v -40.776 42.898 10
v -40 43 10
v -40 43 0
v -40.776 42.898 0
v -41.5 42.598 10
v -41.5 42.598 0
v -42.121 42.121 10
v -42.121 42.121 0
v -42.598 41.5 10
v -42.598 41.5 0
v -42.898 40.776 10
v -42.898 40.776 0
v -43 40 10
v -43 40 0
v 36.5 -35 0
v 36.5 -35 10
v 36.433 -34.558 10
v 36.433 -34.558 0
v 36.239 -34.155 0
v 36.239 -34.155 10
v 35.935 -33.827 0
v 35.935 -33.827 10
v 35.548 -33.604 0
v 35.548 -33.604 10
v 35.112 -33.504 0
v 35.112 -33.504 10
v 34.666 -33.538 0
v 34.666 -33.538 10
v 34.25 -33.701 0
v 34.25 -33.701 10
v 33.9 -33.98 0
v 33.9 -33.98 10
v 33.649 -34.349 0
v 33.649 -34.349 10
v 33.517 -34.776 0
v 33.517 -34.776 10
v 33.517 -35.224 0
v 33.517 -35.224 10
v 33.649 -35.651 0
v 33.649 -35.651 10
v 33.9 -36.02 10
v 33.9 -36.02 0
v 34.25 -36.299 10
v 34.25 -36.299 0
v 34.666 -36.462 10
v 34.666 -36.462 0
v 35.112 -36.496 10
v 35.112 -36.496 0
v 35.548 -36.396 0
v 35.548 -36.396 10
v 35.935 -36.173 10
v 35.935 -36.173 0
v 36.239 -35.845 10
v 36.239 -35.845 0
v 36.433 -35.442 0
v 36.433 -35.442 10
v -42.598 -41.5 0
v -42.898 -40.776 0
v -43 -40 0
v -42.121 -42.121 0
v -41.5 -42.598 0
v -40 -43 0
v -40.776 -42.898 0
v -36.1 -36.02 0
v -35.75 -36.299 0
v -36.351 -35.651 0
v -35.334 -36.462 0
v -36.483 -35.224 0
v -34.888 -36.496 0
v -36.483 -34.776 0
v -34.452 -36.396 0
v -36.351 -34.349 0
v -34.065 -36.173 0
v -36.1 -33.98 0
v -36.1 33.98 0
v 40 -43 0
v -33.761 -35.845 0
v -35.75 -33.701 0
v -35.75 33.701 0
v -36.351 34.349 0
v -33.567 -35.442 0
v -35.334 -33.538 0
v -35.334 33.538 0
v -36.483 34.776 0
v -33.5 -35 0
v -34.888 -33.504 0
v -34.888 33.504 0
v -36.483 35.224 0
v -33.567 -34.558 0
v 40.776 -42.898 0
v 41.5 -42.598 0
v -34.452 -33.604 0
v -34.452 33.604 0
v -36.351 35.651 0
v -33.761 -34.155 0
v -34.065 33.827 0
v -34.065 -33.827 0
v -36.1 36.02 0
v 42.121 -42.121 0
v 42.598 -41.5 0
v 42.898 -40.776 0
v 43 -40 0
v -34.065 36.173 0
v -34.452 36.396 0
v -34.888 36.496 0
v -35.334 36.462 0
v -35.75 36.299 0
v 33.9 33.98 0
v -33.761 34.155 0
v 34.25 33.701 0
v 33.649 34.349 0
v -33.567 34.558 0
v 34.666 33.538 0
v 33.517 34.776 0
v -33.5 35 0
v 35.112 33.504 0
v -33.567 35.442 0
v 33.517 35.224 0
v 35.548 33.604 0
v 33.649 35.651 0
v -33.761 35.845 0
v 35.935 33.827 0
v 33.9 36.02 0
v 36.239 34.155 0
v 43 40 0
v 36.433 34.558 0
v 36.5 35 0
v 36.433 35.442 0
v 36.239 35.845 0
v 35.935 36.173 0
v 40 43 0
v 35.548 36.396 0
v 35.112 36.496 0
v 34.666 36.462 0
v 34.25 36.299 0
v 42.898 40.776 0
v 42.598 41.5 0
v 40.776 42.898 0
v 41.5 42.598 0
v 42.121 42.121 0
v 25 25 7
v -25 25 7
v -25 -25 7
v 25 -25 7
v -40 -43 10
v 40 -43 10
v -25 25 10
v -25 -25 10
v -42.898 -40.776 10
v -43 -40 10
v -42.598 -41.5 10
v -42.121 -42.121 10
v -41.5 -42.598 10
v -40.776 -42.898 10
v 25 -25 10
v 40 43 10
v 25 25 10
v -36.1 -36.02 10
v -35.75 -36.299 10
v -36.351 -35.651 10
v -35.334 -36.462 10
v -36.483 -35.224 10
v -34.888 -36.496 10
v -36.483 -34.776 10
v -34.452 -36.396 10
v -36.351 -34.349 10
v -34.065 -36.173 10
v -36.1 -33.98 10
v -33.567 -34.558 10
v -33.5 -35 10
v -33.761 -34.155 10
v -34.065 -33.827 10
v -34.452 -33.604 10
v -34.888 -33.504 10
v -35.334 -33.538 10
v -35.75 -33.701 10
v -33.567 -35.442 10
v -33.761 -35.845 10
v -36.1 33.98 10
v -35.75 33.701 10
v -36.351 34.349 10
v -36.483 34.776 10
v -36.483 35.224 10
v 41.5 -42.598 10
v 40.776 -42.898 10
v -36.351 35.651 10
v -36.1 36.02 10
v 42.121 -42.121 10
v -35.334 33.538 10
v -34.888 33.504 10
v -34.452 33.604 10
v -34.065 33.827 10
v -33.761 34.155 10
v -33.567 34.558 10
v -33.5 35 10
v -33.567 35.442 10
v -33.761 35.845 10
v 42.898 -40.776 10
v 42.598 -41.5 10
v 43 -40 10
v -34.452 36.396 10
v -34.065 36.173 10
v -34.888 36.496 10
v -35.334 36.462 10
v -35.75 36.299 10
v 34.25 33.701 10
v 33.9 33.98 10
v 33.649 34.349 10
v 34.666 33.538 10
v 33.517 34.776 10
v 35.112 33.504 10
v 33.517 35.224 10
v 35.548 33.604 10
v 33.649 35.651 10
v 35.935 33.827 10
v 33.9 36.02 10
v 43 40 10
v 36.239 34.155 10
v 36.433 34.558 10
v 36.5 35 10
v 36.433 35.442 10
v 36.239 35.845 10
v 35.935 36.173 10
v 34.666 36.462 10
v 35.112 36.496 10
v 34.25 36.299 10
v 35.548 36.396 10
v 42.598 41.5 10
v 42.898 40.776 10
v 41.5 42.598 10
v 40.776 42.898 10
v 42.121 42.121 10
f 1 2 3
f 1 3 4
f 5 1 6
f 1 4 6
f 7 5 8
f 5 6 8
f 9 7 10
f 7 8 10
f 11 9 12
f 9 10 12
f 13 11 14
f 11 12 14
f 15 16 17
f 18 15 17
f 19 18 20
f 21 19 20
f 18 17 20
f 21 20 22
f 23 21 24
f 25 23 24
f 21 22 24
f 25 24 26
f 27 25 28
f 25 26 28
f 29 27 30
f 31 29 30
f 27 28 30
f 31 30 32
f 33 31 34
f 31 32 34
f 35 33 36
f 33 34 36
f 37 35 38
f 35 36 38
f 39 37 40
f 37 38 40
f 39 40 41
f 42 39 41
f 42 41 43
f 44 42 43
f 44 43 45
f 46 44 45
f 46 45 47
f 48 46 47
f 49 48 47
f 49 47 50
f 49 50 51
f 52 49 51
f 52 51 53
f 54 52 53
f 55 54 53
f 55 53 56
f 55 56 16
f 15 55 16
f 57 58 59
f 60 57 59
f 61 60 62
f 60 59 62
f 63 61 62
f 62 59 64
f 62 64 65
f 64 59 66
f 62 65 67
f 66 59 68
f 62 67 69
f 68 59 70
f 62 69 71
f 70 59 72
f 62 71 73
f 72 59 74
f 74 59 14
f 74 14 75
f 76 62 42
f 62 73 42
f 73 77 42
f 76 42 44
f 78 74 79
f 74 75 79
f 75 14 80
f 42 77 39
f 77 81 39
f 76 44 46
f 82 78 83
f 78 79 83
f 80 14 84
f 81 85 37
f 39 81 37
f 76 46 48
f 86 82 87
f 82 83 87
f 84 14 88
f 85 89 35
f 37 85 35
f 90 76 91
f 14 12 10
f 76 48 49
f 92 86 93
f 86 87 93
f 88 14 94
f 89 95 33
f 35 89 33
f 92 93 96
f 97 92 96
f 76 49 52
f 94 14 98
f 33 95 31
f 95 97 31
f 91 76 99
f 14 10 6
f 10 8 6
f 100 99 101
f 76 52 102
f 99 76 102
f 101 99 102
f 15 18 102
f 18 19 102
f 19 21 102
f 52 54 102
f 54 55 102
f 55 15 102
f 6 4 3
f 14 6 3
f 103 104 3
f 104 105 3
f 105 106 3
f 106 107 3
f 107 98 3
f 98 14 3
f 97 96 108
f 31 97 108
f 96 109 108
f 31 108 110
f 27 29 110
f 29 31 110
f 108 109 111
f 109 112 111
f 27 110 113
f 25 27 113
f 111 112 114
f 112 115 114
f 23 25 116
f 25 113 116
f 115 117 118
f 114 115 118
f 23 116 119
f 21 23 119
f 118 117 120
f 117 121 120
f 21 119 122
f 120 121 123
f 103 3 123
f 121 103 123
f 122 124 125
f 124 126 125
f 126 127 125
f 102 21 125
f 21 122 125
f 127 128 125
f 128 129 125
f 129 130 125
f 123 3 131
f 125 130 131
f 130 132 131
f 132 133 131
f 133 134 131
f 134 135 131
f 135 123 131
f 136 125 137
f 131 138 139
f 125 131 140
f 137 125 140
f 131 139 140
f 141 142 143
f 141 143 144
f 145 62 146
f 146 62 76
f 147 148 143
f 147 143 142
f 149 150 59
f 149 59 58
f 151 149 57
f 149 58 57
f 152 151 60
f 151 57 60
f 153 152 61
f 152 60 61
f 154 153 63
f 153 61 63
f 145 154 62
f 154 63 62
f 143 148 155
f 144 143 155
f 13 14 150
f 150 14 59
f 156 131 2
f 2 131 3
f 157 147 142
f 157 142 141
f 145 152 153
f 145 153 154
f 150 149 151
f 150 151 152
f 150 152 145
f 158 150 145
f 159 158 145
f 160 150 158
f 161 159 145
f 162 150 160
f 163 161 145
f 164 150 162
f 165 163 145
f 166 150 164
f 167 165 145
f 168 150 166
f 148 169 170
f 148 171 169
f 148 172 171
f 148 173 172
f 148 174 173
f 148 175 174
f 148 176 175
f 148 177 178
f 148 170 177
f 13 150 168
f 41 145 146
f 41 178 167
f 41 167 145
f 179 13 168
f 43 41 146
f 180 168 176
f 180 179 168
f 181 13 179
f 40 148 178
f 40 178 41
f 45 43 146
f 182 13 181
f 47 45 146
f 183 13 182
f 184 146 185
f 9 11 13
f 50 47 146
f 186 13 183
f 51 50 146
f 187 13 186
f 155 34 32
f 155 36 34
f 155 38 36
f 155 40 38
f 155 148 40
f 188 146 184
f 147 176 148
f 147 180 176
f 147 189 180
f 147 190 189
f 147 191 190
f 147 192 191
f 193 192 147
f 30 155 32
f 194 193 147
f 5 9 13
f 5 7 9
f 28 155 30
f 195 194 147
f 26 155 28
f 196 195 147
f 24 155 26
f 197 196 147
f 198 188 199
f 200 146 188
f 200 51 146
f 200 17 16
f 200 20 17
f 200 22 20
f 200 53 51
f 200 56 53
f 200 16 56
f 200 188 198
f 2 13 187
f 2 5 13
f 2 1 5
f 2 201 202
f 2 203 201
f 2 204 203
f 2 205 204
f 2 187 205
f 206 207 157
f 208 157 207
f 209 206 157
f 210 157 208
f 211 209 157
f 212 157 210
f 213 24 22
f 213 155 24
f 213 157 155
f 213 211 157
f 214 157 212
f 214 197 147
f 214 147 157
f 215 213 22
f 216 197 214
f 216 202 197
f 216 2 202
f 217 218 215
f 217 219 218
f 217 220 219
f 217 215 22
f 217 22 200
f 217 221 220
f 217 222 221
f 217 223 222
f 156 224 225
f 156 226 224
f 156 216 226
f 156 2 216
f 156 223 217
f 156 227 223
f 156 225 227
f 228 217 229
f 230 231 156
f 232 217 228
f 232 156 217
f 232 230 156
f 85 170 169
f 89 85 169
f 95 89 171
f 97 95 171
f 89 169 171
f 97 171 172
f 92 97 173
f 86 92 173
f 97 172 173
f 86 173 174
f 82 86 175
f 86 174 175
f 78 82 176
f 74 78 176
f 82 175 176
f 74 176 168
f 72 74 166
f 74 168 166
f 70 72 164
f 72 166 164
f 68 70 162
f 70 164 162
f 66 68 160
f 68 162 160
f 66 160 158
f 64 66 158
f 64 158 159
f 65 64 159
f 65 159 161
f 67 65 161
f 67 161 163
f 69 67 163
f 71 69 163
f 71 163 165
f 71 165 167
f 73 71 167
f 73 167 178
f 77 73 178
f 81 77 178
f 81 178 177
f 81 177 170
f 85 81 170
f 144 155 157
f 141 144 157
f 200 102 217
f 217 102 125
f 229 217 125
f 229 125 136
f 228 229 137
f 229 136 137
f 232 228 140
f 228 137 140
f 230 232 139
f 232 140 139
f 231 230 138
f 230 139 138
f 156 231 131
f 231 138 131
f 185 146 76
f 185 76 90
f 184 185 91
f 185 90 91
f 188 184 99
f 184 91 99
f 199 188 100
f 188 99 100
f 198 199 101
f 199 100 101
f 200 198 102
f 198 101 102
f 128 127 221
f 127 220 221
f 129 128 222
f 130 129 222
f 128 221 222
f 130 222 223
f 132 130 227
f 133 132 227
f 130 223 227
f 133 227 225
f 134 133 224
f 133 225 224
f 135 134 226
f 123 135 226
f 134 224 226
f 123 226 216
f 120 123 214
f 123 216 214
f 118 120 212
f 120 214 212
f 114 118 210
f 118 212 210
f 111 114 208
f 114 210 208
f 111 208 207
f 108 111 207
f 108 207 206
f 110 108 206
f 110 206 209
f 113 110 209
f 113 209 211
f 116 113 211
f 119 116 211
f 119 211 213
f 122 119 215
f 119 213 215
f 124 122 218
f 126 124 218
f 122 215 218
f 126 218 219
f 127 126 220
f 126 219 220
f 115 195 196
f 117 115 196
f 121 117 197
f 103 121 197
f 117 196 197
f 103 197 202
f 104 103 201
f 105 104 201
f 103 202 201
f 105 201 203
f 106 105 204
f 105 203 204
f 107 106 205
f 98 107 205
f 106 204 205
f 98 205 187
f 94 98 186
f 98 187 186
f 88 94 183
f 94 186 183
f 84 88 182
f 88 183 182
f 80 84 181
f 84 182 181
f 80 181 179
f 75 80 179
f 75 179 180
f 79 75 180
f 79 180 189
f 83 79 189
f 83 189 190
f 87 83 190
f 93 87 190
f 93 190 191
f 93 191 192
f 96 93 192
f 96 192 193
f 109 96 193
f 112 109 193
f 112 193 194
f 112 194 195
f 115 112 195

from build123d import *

# Parameters (mm, degrees)
EXTRUDE_1_DEPTH     = 10
SKETCH_2_W          = 50
SKETCH_2_H          = 50
CUT_EXTRUDE_1_DEPTH = 3
SKETCH_3_R          = 1.5
CUT_EXTRUDE_2_DEPTH = 87


with BuildPart() as part:
    # 草图1 → 凸台-拉伸1 (new body)
    with BuildSketch(Plane.XY):
        with BuildLine():
            Line((-40, -43), (40, -43))
            ThreePointArc((40, -43), (42.121320344, -42.121320344), (43, -40))
            Line((43, -40), (43, 40))
            ThreePointArc((43, 40), (42.121320344, 42.121320344), (40, 43))
            Line((40, 43), (-40, 43))
            ThreePointArc((-40, 43), (-42.121320344, 42.121320344), (-43, 40))
            Line((-43, 40), (-43, -40))
            ThreePointArc((-43, -40), (-42.121320344, -42.121320344), (-40, -43))
        make_face()
    extrude(amount=EXTRUDE_1_DEPTH)

    # 草图2 → 切除-拉伸1 (cut)
    with BuildSketch(Plane.XY.offset(10)):
        Rectangle(SKETCH_2_W, SKETCH_2_H)
    extrude(amount=-CUT_EXTRUDE_1_DEPTH, mode=Mode.SUBTRACT)

    # 草图3 → 切除-拉伸2 (cut, symmetric)
    with BuildSketch(Plane.XY.offset(10)):
        with Locations((-35, -35)):
            Circle(SKETCH_3_R)
        with Locations((-35, 35)):
            Circle(SKETCH_3_R)
        with Locations((35, -35)):
            Circle(SKETCH_3_R)
        with Locations((35, 35)):
            Circle(SKETCH_3_R)
    extrude(amount=CUT_EXTRUDE_2_DEPTH, both=True, mode=Mode.SUBTRACT)


solid = part.part
